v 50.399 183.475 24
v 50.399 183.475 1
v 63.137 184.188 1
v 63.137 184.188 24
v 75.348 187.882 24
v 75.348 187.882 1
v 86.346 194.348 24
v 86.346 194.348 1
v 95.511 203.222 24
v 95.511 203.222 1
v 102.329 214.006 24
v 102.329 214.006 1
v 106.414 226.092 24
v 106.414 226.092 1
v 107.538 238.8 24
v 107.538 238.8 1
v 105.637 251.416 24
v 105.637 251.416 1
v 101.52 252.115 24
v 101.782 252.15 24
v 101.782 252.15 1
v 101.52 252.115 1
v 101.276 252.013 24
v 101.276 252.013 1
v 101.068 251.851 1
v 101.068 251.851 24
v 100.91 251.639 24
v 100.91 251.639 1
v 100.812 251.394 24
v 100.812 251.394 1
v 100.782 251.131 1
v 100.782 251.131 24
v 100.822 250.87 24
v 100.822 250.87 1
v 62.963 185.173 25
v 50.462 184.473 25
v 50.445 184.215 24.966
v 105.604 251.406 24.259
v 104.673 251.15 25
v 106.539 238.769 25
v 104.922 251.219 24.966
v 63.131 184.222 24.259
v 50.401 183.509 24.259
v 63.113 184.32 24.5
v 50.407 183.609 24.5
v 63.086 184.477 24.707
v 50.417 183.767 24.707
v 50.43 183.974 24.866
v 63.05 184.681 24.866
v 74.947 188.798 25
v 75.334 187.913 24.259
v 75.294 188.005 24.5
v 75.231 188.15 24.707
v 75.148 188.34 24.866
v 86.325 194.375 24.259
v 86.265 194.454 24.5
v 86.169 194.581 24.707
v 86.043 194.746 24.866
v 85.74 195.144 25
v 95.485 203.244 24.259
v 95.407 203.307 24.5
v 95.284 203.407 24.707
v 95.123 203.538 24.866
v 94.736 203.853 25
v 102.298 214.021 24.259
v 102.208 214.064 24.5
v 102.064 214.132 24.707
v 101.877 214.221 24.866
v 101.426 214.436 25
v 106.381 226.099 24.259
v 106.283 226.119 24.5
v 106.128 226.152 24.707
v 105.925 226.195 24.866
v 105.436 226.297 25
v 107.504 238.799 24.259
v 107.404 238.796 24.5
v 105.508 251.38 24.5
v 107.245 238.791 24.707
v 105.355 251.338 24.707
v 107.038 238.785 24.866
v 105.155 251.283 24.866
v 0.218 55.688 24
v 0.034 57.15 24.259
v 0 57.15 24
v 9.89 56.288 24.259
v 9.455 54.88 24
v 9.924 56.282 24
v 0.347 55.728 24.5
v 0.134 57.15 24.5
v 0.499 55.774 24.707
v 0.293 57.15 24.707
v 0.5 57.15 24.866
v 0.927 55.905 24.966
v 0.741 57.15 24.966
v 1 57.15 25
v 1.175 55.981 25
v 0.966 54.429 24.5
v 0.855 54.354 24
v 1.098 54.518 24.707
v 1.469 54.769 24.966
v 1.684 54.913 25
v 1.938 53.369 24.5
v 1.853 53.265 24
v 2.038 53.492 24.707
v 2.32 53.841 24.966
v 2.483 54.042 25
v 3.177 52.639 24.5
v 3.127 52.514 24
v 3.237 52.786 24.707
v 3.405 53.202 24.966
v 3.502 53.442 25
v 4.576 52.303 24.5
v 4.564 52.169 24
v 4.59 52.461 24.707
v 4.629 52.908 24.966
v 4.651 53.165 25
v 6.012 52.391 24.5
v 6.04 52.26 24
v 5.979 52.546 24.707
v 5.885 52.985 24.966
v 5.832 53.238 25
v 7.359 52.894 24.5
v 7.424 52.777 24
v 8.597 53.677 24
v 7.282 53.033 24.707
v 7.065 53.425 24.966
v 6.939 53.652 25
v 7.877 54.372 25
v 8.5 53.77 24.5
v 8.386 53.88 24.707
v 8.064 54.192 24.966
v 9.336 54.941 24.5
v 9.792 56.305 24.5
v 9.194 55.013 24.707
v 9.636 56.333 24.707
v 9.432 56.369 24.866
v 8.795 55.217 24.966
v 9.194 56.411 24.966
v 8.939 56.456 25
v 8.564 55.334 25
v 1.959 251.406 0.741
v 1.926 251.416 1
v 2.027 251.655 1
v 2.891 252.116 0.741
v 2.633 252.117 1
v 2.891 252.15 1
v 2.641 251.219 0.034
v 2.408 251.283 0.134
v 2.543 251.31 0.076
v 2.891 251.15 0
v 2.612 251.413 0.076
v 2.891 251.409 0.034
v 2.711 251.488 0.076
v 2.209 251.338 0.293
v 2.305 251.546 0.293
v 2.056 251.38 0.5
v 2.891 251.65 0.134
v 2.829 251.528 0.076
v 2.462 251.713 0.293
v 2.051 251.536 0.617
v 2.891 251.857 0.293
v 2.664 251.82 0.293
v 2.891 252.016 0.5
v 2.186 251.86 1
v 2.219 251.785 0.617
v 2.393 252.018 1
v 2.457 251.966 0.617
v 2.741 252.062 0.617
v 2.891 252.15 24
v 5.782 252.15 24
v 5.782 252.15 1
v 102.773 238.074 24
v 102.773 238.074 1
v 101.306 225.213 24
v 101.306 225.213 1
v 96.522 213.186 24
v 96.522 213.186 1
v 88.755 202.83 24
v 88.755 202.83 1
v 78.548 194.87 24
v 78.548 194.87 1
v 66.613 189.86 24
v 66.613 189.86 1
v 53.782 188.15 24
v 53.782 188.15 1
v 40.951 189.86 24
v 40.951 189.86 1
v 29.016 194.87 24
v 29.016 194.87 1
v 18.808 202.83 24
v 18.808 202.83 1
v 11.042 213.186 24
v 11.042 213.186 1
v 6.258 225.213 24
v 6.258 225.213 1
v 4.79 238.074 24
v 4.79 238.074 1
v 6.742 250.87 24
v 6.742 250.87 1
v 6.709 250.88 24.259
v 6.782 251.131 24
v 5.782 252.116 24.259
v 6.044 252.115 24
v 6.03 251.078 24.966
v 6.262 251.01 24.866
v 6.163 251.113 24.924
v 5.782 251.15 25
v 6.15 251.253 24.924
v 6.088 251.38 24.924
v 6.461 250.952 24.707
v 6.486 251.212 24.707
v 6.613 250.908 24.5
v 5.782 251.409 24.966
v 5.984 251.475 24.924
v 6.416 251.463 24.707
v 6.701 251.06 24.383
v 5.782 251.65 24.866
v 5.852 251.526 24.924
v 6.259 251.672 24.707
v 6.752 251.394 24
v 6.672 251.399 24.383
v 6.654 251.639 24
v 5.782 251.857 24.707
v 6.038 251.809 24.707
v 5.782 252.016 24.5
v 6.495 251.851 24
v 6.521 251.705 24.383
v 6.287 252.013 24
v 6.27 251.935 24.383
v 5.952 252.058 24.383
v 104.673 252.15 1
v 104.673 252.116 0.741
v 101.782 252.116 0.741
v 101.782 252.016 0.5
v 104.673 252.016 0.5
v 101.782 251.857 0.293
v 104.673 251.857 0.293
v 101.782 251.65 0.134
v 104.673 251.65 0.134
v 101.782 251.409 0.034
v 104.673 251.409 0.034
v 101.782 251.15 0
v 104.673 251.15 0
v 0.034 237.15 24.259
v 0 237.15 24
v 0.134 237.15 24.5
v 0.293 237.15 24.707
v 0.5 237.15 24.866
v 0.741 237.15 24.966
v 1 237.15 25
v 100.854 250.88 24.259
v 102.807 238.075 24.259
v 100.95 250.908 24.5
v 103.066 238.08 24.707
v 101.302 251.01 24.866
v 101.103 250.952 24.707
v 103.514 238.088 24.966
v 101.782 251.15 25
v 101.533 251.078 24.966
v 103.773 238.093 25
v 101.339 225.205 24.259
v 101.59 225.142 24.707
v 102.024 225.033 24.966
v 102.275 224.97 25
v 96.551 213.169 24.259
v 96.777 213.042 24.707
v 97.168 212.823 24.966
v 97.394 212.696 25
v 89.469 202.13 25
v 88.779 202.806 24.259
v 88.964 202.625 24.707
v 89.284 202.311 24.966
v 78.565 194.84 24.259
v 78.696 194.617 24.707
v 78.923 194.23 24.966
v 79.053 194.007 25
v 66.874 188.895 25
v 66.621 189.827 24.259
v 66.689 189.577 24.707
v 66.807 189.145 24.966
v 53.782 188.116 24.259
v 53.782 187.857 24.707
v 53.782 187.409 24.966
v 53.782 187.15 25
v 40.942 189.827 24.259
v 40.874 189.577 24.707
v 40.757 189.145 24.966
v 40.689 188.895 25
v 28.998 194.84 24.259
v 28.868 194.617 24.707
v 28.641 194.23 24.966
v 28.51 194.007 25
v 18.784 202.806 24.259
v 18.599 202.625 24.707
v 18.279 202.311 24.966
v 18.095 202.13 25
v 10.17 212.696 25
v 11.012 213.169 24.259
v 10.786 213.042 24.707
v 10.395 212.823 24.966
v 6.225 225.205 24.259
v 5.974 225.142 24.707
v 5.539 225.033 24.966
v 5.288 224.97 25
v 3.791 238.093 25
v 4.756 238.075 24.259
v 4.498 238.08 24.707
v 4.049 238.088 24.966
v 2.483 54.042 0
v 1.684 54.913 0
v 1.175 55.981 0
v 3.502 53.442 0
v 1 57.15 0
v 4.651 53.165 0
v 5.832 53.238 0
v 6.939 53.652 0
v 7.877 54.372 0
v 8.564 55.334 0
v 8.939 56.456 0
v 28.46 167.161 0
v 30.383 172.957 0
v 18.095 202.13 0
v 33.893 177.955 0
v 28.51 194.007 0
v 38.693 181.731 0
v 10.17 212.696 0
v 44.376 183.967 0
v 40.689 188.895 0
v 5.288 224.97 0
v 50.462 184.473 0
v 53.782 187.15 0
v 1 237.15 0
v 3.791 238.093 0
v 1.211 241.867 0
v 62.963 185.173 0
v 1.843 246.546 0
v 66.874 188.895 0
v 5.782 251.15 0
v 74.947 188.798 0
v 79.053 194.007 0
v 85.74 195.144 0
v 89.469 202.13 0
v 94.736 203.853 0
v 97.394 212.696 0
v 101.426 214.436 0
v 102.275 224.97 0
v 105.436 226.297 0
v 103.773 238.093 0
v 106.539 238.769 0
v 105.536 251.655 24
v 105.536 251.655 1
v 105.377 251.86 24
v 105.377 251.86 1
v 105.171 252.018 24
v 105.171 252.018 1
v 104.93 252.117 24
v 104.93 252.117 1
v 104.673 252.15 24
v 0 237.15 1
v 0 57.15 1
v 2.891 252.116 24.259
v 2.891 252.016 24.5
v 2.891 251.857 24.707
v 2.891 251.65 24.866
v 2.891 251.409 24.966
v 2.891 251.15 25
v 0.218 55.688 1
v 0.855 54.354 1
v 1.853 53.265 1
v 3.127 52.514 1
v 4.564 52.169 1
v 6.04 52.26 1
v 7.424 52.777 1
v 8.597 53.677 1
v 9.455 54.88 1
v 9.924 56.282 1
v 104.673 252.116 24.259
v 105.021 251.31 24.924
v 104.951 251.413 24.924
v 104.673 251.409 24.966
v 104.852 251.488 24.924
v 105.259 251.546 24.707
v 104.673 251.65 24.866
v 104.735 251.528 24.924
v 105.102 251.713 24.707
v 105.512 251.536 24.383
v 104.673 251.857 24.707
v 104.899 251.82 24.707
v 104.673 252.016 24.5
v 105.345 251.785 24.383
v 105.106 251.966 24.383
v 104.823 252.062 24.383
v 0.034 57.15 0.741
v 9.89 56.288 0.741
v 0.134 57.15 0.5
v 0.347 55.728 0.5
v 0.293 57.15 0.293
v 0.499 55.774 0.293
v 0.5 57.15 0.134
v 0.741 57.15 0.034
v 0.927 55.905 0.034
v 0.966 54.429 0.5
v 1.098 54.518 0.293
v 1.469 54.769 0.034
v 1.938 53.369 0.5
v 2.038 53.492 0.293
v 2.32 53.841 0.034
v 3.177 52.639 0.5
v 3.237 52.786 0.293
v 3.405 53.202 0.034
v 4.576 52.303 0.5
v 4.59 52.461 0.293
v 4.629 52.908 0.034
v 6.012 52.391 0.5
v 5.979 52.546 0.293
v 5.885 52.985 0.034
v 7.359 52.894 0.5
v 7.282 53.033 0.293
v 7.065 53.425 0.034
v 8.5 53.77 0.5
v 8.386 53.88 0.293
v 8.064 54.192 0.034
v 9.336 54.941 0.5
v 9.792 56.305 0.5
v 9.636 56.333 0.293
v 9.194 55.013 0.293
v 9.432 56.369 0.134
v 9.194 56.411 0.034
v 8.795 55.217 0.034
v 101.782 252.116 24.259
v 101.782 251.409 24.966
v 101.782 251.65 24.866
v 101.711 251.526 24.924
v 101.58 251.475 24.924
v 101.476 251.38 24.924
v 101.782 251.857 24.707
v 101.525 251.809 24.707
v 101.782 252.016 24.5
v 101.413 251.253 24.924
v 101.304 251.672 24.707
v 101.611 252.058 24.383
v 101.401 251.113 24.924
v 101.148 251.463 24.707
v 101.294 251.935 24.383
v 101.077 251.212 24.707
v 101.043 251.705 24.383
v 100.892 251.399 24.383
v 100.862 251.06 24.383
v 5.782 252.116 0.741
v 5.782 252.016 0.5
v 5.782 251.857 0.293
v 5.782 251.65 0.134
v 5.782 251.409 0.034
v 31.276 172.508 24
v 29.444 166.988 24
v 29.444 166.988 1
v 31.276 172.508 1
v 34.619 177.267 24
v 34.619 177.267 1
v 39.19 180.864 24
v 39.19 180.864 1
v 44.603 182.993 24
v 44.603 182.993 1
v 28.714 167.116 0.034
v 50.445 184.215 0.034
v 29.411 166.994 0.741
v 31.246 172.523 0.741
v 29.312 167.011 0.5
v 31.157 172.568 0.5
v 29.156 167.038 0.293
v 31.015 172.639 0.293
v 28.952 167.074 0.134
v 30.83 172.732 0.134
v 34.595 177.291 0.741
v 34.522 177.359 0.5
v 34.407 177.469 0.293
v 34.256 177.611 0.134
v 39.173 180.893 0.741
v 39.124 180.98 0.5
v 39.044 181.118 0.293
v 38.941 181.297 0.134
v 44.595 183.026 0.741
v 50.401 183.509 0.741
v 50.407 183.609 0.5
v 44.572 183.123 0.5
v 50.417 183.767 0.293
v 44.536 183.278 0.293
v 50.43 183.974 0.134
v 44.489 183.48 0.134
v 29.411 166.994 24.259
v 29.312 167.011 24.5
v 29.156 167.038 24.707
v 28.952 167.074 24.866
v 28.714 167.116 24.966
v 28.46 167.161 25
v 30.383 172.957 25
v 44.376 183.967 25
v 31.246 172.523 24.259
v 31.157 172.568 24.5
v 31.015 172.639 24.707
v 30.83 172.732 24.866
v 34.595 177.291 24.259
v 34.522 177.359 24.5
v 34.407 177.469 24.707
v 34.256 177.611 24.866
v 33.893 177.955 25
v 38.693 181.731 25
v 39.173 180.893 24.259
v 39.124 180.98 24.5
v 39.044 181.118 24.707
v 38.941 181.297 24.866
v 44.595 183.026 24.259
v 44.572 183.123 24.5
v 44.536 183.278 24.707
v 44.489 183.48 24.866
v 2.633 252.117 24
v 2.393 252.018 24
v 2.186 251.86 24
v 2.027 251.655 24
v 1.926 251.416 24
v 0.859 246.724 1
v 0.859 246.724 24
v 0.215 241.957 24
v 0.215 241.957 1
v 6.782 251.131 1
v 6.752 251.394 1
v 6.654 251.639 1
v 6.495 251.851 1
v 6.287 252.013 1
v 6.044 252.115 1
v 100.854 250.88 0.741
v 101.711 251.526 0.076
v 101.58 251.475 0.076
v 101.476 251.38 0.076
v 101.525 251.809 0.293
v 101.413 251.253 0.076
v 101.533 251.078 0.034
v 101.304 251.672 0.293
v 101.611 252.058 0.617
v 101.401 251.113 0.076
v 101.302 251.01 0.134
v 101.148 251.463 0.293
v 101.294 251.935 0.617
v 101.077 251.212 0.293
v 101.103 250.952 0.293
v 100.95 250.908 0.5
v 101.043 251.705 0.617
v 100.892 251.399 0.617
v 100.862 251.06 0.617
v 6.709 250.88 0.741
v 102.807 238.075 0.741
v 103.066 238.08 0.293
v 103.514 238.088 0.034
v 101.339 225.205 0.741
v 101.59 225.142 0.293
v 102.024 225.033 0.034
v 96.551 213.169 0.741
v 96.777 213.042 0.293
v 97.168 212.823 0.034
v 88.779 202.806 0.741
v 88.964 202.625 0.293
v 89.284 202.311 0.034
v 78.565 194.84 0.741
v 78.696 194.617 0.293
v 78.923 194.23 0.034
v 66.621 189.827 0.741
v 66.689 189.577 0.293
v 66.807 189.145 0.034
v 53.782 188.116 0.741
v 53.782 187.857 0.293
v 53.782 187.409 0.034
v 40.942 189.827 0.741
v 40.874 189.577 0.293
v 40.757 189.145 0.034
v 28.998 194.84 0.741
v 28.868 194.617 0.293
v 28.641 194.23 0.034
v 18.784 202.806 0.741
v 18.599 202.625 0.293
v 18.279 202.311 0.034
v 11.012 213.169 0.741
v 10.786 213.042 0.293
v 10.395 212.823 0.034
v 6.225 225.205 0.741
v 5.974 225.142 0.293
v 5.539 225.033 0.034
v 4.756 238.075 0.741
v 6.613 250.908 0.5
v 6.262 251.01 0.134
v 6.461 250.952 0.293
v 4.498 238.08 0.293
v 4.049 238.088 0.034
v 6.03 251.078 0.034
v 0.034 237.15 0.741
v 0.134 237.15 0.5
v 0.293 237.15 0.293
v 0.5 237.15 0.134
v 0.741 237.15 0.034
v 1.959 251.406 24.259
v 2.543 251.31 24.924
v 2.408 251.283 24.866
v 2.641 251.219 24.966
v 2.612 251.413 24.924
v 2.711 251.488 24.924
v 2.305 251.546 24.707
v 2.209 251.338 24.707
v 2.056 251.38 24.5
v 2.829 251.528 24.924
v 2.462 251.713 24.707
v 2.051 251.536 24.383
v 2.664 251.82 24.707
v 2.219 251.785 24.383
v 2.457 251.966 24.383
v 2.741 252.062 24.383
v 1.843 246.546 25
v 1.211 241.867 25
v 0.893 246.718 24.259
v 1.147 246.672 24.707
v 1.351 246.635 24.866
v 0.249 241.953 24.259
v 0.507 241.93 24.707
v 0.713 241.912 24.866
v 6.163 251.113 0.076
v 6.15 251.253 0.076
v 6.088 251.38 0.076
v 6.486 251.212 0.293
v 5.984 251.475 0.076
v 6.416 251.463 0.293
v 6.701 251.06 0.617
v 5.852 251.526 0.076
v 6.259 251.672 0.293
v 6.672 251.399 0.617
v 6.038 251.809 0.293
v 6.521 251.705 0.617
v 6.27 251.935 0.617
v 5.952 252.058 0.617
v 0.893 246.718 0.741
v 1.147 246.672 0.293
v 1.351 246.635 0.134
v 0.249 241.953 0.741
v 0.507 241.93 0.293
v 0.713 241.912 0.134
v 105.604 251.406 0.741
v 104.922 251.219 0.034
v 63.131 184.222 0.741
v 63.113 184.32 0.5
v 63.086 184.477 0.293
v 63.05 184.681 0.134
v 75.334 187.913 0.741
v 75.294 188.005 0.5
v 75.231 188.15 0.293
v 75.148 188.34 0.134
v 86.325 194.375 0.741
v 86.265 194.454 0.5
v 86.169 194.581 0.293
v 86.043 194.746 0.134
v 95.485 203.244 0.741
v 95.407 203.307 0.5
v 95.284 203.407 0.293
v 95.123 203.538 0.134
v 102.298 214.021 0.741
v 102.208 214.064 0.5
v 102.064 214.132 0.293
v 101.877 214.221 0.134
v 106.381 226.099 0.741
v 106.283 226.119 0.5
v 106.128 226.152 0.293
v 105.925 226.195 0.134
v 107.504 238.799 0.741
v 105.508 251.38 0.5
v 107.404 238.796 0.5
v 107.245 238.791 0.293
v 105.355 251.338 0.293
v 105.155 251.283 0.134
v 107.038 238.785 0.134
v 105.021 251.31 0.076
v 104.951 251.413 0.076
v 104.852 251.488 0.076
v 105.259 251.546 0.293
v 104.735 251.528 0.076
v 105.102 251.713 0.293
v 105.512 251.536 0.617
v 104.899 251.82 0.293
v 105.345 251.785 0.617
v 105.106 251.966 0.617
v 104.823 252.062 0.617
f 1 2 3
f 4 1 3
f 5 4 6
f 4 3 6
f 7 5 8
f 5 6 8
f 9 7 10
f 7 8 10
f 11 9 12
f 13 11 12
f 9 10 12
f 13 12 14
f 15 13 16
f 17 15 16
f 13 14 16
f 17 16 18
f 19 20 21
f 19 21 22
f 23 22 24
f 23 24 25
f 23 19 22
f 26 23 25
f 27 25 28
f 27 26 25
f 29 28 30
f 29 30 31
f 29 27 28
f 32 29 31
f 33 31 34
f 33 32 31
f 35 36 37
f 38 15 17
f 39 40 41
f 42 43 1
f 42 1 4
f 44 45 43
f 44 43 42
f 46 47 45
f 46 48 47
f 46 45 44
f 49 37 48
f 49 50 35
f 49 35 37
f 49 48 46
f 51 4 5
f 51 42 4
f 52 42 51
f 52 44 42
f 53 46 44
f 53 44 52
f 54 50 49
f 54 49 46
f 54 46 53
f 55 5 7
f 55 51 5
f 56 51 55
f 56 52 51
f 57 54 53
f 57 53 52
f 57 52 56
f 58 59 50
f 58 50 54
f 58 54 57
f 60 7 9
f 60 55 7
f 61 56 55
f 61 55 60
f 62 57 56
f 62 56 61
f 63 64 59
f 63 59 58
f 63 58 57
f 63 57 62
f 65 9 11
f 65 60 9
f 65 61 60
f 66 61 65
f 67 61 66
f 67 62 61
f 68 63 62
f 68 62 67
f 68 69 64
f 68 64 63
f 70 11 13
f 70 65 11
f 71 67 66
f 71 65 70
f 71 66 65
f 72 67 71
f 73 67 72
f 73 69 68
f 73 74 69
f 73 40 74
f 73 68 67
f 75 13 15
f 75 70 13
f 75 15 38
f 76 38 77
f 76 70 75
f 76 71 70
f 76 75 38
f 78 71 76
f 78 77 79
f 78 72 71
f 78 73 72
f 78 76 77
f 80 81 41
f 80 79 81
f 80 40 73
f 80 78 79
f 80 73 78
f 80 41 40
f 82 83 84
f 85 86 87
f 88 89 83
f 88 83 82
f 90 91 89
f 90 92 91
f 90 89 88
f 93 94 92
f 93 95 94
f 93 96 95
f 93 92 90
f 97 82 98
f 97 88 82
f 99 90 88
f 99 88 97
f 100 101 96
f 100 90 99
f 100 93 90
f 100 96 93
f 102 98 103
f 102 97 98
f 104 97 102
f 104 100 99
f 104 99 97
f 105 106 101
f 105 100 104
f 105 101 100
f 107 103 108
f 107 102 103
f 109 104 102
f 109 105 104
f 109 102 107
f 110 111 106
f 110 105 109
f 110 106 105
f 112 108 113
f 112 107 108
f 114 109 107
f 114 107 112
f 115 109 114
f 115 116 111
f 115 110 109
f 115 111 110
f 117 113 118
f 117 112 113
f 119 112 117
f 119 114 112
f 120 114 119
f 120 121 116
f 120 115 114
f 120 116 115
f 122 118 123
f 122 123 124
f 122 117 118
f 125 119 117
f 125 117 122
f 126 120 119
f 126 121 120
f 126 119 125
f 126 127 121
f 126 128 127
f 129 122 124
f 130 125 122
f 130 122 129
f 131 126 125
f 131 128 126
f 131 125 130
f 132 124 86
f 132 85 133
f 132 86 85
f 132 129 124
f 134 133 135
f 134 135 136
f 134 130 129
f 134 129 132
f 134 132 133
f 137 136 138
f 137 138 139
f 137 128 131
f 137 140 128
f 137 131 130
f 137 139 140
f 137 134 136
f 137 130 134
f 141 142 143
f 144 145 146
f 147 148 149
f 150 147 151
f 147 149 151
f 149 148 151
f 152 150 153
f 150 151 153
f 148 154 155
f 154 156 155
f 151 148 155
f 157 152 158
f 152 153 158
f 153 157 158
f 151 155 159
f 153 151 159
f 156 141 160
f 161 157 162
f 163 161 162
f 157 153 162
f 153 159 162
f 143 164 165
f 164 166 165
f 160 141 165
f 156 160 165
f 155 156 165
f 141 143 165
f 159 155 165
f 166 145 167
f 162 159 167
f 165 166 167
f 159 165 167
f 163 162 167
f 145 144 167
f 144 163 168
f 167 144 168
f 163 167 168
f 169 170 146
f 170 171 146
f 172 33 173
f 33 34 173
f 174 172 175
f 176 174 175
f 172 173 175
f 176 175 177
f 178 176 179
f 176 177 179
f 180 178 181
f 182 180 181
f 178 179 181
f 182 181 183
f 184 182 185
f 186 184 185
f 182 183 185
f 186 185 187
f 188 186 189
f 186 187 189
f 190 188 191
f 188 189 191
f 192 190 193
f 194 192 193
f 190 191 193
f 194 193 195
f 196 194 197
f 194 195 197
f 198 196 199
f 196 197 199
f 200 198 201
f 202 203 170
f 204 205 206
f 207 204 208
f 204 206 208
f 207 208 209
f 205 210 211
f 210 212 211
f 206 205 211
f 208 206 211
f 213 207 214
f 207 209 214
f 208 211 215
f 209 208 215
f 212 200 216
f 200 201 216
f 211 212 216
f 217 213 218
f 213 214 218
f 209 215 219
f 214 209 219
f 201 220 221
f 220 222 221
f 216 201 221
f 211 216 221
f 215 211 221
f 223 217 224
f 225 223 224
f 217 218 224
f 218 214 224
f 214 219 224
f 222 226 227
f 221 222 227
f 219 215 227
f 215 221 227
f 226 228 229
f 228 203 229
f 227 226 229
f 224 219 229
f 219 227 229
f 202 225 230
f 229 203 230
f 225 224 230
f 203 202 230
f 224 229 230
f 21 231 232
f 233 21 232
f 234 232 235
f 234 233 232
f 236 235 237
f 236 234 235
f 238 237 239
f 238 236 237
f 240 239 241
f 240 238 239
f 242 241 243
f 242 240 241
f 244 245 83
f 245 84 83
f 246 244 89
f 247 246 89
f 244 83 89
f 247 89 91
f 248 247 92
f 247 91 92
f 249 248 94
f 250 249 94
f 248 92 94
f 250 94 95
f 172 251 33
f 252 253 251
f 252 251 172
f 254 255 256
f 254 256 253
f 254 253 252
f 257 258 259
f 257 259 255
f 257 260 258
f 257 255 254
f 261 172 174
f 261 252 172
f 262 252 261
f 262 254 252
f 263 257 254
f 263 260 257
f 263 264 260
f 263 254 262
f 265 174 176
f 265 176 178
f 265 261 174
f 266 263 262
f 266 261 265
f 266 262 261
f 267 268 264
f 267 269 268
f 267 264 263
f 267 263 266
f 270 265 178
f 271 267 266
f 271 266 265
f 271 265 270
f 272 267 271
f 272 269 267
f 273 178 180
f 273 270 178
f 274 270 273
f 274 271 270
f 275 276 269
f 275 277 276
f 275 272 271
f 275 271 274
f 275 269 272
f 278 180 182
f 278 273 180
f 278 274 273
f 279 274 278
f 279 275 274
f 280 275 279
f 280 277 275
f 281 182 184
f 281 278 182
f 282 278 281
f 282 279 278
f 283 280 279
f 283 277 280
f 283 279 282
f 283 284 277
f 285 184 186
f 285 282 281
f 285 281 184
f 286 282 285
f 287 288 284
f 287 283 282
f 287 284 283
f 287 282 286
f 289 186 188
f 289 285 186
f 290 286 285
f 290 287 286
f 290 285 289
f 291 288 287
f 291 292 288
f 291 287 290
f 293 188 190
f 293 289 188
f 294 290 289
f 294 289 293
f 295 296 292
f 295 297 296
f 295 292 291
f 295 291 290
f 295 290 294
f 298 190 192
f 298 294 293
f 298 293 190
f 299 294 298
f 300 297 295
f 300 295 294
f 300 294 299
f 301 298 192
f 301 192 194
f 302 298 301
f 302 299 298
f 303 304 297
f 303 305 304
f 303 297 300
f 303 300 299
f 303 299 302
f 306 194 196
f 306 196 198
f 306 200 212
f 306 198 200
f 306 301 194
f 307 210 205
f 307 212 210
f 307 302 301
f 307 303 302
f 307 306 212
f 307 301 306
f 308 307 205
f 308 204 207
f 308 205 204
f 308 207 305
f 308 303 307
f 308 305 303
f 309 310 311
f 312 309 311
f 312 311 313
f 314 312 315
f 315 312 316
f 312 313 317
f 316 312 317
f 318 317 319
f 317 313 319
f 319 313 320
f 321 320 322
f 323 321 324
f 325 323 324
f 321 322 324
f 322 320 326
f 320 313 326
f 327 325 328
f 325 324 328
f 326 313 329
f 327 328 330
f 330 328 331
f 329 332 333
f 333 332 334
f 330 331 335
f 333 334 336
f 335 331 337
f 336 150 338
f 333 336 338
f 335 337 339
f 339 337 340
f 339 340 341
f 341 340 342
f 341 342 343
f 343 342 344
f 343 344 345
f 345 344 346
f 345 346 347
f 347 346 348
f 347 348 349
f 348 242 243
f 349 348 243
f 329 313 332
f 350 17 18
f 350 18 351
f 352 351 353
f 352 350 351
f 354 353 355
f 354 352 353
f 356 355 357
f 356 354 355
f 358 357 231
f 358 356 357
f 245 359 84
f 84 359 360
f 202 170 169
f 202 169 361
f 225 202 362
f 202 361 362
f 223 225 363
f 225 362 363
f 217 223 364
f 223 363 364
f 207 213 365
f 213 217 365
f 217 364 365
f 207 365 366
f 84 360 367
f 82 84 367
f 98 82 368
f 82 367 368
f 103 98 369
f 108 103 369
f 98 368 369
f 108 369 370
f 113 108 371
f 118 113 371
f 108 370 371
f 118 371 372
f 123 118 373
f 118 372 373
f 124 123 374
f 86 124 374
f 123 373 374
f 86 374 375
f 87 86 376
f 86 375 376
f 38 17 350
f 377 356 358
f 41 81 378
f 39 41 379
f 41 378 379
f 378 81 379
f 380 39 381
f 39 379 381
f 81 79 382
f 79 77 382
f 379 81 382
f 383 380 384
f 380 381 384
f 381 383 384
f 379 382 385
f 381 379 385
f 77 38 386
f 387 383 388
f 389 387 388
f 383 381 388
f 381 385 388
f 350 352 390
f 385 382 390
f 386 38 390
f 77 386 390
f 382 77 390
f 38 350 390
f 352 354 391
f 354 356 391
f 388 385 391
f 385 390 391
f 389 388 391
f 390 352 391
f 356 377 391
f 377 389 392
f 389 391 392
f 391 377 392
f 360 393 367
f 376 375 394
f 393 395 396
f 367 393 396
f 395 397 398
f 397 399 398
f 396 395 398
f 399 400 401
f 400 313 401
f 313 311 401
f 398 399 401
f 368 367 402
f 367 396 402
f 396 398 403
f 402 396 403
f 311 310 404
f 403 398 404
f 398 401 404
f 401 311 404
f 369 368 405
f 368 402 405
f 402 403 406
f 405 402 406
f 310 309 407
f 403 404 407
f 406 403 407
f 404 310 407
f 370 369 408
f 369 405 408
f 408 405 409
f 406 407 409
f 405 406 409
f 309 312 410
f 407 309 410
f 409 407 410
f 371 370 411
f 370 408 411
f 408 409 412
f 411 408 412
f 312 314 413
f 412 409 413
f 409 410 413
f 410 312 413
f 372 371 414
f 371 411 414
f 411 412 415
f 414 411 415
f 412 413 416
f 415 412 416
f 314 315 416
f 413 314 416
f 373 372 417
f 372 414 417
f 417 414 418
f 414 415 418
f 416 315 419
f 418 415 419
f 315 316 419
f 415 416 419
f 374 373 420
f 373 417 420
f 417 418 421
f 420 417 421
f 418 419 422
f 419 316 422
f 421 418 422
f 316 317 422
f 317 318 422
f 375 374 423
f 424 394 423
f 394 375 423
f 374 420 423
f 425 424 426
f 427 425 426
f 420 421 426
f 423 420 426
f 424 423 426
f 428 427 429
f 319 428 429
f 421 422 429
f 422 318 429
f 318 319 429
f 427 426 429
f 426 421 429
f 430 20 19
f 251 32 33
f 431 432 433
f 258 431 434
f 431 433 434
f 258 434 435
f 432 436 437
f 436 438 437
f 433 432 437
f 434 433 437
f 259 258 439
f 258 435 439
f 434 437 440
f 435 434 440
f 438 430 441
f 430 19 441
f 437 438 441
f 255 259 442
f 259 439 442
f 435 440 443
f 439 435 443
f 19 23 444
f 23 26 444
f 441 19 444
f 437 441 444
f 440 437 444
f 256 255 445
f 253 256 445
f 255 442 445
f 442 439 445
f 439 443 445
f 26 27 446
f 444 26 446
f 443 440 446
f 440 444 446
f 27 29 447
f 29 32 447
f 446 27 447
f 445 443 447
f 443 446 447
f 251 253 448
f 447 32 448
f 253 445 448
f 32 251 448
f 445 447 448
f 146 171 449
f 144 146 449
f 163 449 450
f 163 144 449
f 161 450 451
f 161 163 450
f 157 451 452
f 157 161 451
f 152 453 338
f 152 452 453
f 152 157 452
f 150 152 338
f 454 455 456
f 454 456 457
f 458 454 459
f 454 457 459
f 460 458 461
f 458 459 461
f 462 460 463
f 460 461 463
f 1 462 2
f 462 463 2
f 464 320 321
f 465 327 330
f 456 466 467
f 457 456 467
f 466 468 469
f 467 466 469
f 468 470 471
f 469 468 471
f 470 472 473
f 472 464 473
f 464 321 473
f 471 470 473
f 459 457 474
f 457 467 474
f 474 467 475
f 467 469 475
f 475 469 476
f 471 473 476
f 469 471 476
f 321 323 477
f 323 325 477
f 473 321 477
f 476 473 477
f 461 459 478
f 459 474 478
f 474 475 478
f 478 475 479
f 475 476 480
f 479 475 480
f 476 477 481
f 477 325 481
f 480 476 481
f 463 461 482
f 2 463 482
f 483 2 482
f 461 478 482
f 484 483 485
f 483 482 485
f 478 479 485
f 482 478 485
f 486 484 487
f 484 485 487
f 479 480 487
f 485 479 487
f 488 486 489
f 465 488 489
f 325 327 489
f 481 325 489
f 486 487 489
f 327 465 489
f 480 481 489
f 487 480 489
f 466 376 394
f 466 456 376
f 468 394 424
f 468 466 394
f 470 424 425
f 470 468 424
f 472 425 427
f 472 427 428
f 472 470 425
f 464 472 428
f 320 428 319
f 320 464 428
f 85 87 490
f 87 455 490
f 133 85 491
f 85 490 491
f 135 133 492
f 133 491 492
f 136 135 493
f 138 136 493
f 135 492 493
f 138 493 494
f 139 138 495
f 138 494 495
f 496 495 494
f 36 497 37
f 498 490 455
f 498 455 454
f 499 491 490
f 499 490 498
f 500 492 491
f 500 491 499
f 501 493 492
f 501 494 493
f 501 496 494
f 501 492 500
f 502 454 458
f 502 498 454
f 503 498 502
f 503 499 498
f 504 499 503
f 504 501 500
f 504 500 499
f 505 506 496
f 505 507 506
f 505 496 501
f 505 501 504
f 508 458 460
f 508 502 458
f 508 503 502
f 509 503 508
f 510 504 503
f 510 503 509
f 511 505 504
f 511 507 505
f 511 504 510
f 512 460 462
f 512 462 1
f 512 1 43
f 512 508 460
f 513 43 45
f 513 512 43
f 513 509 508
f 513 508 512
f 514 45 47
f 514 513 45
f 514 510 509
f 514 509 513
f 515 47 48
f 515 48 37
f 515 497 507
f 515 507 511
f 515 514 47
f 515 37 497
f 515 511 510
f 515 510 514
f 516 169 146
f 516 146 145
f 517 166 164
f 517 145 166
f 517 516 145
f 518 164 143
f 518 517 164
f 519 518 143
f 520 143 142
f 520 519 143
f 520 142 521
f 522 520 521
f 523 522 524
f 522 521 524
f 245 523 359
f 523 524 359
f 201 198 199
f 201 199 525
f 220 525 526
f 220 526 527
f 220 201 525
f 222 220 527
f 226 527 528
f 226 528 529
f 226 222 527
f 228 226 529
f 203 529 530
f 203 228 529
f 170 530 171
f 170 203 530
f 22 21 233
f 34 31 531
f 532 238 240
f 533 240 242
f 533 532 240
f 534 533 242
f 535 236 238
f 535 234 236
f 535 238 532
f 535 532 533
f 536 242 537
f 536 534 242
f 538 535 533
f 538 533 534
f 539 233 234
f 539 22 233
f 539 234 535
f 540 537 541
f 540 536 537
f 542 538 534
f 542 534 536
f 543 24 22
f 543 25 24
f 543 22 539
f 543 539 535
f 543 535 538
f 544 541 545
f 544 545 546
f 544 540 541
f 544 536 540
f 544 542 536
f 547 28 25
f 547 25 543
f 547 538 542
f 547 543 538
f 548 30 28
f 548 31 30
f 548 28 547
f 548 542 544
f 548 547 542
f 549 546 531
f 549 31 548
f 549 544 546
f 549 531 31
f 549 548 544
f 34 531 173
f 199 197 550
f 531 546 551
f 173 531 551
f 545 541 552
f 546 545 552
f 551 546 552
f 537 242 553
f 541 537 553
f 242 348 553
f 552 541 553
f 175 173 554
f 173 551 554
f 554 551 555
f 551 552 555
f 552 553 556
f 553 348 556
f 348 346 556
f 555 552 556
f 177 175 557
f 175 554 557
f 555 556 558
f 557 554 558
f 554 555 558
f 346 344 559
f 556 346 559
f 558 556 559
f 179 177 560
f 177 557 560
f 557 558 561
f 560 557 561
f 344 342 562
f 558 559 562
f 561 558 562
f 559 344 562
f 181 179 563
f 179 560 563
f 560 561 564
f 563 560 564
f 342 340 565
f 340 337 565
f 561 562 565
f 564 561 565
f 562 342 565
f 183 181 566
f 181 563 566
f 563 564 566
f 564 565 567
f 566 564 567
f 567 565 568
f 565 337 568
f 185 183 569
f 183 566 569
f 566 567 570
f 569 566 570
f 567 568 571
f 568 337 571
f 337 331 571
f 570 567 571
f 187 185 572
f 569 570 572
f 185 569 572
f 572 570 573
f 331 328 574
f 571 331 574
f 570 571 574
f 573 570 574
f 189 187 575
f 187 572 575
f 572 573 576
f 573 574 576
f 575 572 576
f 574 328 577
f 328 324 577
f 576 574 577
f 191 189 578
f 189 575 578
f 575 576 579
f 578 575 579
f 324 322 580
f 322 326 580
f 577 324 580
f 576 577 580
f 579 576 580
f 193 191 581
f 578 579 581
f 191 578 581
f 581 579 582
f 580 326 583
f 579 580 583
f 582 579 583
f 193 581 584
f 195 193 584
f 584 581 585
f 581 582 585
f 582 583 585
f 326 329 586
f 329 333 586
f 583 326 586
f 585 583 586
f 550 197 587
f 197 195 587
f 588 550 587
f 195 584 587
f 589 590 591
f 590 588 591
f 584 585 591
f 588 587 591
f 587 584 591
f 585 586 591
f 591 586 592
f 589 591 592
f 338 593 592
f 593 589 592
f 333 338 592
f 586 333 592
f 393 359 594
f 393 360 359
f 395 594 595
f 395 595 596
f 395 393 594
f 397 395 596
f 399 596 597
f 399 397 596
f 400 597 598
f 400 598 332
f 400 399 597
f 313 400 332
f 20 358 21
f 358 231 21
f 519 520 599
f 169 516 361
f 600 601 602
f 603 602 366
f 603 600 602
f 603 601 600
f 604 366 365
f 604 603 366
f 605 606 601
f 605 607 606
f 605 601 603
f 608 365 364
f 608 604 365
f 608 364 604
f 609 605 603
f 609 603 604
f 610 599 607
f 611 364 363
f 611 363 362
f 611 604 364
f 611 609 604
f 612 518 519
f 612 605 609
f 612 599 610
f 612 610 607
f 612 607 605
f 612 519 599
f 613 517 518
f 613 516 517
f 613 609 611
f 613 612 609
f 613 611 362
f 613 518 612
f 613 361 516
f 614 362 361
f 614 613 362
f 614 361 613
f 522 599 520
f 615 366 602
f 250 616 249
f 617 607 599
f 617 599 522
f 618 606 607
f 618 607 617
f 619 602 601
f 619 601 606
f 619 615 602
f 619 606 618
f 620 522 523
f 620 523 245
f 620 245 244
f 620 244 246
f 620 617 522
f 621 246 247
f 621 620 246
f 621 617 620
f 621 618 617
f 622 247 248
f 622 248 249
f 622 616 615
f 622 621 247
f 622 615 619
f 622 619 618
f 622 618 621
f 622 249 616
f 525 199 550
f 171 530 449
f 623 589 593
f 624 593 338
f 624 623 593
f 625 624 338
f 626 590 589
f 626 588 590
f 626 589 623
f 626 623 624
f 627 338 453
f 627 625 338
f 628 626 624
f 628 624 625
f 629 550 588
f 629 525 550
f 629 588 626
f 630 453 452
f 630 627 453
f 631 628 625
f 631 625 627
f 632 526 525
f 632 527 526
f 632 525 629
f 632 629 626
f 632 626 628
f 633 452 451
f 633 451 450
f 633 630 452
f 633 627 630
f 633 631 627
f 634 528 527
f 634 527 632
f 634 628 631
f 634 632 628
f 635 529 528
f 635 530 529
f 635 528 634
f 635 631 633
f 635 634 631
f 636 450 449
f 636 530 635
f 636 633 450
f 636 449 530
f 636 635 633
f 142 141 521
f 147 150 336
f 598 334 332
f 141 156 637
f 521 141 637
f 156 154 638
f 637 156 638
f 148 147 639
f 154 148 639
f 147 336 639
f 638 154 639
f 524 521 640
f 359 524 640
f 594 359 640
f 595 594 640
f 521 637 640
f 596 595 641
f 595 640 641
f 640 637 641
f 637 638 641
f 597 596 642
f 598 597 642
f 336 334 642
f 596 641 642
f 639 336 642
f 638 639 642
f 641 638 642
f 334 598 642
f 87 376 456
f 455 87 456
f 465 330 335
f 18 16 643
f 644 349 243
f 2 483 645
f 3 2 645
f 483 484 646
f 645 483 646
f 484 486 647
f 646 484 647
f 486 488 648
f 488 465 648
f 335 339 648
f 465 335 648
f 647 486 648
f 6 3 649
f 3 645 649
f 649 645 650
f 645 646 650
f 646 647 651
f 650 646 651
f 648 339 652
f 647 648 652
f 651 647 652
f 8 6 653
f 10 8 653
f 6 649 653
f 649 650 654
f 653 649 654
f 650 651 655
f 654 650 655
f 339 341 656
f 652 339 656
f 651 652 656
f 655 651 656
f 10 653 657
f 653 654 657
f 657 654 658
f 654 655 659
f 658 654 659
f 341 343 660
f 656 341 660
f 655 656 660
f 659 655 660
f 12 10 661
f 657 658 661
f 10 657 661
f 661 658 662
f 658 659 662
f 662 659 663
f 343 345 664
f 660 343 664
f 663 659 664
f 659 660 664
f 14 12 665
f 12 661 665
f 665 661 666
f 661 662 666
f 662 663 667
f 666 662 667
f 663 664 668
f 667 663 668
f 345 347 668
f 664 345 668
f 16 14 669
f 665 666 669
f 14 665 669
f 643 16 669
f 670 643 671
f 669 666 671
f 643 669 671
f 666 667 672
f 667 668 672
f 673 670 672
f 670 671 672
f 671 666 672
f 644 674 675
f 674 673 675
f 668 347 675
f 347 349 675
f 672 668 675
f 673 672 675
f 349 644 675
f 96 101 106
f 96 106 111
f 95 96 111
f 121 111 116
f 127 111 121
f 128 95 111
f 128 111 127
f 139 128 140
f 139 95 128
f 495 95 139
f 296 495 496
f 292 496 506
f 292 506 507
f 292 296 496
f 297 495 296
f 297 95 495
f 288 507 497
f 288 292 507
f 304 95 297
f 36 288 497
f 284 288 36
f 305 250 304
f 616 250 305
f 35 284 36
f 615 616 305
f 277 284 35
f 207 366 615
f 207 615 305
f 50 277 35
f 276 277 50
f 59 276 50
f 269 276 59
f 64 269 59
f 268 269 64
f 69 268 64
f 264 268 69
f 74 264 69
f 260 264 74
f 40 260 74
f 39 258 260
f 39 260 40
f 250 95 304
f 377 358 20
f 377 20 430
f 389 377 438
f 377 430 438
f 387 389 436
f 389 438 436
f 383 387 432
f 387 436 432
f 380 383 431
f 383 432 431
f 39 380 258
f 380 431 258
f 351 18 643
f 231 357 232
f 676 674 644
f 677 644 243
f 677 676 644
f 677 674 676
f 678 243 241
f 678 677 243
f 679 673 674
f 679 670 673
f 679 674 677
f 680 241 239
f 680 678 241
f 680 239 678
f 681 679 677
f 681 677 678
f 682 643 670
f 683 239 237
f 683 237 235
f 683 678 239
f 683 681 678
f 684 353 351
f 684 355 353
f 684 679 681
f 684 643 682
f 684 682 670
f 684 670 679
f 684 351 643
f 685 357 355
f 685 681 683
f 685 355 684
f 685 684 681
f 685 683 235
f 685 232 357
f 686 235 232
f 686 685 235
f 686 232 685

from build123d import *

# Parameters (mm, degrees)
F1_DEPTH = 25
F2_R     = 1


with BuildPart() as f1:
    # F0 (on Top) → F1 (new body)
    with BuildSketch(Plane.XY):
        with BuildLine():
            Line((0, 237.1502615138), (0, 57.1502615138))
            ThreePointArc((0, 57.1502615138), (4.5642212863, 52.1692880233), (9.9240387651, 56.2820206255))
            Line((9.9240387651, 56.2820206255), (29.4444190586, 166.987598496))
            ThreePointArc((29.4444190586, 166.987598496), (36.7733002708, 179.2324763201), (50.3986553344, 183.4750265133))
            ThreePointArc((50.3986553344, 183.4750265133), (95.7512352541, 203.5193518716), (105.4293606826, 252.1502615138))
            Line((105.4293606826, 252.1502615138), (100.4293606826, 252.1502615138))
            ThreePointArc((100.4293606826, 252.1502615138), (53.7817455238, 188.1502615138), (7.134130365, 252.1502615138))
            Line((7.134130365, 252.1502615138), (2.134130365, 252.1502615138))
            ThreePointArc((2.134130365, 252.1502615138), (0.536205584, 244.7257897531), (0, 237.1502615138))
        make_face()
    extrude(amount=F1_DEPTH)

    # F2
    f2_edges = [f1.edges().sort_by_distance(p)[0] for p in [
        (19.684229, 111.63481, 25),
        (102.929361, 252.150262, 25),
        (53.781746, 188.150262, 25),
        (4.63413, 252.150262, 25),
        (0.536206, 244.72579, 25),
        (19.684229, 111.63481, 0),
        (36.7733, 179.232476, 0),
        (95.751235, 203.519352, 0),
        (36.7733, 179.232476, 25),
        (95.751235, 203.519352, 25),
        (102.929361, 252.150262, 0),
        (53.781746, 188.150262, 0),
        (0, 147.150262, 0),
        (4.63413, 252.150262, 0),
        (0.536206, 244.72579, 0),
        (4.564221, 52.169288, 0),
        (105.429361, 252.150262, 12.5),
        (100.429361, 252.150262, 12.5),
        (7.13413, 252.150262, 12.5),
        (2.13413, 252.150262, 12.5),
        (0, 147.150262, 25),
        (4.564221, 52.169288, 25),
    ]]
    fillet(f2_edges, radius=F2_R)


solid = f1.part
